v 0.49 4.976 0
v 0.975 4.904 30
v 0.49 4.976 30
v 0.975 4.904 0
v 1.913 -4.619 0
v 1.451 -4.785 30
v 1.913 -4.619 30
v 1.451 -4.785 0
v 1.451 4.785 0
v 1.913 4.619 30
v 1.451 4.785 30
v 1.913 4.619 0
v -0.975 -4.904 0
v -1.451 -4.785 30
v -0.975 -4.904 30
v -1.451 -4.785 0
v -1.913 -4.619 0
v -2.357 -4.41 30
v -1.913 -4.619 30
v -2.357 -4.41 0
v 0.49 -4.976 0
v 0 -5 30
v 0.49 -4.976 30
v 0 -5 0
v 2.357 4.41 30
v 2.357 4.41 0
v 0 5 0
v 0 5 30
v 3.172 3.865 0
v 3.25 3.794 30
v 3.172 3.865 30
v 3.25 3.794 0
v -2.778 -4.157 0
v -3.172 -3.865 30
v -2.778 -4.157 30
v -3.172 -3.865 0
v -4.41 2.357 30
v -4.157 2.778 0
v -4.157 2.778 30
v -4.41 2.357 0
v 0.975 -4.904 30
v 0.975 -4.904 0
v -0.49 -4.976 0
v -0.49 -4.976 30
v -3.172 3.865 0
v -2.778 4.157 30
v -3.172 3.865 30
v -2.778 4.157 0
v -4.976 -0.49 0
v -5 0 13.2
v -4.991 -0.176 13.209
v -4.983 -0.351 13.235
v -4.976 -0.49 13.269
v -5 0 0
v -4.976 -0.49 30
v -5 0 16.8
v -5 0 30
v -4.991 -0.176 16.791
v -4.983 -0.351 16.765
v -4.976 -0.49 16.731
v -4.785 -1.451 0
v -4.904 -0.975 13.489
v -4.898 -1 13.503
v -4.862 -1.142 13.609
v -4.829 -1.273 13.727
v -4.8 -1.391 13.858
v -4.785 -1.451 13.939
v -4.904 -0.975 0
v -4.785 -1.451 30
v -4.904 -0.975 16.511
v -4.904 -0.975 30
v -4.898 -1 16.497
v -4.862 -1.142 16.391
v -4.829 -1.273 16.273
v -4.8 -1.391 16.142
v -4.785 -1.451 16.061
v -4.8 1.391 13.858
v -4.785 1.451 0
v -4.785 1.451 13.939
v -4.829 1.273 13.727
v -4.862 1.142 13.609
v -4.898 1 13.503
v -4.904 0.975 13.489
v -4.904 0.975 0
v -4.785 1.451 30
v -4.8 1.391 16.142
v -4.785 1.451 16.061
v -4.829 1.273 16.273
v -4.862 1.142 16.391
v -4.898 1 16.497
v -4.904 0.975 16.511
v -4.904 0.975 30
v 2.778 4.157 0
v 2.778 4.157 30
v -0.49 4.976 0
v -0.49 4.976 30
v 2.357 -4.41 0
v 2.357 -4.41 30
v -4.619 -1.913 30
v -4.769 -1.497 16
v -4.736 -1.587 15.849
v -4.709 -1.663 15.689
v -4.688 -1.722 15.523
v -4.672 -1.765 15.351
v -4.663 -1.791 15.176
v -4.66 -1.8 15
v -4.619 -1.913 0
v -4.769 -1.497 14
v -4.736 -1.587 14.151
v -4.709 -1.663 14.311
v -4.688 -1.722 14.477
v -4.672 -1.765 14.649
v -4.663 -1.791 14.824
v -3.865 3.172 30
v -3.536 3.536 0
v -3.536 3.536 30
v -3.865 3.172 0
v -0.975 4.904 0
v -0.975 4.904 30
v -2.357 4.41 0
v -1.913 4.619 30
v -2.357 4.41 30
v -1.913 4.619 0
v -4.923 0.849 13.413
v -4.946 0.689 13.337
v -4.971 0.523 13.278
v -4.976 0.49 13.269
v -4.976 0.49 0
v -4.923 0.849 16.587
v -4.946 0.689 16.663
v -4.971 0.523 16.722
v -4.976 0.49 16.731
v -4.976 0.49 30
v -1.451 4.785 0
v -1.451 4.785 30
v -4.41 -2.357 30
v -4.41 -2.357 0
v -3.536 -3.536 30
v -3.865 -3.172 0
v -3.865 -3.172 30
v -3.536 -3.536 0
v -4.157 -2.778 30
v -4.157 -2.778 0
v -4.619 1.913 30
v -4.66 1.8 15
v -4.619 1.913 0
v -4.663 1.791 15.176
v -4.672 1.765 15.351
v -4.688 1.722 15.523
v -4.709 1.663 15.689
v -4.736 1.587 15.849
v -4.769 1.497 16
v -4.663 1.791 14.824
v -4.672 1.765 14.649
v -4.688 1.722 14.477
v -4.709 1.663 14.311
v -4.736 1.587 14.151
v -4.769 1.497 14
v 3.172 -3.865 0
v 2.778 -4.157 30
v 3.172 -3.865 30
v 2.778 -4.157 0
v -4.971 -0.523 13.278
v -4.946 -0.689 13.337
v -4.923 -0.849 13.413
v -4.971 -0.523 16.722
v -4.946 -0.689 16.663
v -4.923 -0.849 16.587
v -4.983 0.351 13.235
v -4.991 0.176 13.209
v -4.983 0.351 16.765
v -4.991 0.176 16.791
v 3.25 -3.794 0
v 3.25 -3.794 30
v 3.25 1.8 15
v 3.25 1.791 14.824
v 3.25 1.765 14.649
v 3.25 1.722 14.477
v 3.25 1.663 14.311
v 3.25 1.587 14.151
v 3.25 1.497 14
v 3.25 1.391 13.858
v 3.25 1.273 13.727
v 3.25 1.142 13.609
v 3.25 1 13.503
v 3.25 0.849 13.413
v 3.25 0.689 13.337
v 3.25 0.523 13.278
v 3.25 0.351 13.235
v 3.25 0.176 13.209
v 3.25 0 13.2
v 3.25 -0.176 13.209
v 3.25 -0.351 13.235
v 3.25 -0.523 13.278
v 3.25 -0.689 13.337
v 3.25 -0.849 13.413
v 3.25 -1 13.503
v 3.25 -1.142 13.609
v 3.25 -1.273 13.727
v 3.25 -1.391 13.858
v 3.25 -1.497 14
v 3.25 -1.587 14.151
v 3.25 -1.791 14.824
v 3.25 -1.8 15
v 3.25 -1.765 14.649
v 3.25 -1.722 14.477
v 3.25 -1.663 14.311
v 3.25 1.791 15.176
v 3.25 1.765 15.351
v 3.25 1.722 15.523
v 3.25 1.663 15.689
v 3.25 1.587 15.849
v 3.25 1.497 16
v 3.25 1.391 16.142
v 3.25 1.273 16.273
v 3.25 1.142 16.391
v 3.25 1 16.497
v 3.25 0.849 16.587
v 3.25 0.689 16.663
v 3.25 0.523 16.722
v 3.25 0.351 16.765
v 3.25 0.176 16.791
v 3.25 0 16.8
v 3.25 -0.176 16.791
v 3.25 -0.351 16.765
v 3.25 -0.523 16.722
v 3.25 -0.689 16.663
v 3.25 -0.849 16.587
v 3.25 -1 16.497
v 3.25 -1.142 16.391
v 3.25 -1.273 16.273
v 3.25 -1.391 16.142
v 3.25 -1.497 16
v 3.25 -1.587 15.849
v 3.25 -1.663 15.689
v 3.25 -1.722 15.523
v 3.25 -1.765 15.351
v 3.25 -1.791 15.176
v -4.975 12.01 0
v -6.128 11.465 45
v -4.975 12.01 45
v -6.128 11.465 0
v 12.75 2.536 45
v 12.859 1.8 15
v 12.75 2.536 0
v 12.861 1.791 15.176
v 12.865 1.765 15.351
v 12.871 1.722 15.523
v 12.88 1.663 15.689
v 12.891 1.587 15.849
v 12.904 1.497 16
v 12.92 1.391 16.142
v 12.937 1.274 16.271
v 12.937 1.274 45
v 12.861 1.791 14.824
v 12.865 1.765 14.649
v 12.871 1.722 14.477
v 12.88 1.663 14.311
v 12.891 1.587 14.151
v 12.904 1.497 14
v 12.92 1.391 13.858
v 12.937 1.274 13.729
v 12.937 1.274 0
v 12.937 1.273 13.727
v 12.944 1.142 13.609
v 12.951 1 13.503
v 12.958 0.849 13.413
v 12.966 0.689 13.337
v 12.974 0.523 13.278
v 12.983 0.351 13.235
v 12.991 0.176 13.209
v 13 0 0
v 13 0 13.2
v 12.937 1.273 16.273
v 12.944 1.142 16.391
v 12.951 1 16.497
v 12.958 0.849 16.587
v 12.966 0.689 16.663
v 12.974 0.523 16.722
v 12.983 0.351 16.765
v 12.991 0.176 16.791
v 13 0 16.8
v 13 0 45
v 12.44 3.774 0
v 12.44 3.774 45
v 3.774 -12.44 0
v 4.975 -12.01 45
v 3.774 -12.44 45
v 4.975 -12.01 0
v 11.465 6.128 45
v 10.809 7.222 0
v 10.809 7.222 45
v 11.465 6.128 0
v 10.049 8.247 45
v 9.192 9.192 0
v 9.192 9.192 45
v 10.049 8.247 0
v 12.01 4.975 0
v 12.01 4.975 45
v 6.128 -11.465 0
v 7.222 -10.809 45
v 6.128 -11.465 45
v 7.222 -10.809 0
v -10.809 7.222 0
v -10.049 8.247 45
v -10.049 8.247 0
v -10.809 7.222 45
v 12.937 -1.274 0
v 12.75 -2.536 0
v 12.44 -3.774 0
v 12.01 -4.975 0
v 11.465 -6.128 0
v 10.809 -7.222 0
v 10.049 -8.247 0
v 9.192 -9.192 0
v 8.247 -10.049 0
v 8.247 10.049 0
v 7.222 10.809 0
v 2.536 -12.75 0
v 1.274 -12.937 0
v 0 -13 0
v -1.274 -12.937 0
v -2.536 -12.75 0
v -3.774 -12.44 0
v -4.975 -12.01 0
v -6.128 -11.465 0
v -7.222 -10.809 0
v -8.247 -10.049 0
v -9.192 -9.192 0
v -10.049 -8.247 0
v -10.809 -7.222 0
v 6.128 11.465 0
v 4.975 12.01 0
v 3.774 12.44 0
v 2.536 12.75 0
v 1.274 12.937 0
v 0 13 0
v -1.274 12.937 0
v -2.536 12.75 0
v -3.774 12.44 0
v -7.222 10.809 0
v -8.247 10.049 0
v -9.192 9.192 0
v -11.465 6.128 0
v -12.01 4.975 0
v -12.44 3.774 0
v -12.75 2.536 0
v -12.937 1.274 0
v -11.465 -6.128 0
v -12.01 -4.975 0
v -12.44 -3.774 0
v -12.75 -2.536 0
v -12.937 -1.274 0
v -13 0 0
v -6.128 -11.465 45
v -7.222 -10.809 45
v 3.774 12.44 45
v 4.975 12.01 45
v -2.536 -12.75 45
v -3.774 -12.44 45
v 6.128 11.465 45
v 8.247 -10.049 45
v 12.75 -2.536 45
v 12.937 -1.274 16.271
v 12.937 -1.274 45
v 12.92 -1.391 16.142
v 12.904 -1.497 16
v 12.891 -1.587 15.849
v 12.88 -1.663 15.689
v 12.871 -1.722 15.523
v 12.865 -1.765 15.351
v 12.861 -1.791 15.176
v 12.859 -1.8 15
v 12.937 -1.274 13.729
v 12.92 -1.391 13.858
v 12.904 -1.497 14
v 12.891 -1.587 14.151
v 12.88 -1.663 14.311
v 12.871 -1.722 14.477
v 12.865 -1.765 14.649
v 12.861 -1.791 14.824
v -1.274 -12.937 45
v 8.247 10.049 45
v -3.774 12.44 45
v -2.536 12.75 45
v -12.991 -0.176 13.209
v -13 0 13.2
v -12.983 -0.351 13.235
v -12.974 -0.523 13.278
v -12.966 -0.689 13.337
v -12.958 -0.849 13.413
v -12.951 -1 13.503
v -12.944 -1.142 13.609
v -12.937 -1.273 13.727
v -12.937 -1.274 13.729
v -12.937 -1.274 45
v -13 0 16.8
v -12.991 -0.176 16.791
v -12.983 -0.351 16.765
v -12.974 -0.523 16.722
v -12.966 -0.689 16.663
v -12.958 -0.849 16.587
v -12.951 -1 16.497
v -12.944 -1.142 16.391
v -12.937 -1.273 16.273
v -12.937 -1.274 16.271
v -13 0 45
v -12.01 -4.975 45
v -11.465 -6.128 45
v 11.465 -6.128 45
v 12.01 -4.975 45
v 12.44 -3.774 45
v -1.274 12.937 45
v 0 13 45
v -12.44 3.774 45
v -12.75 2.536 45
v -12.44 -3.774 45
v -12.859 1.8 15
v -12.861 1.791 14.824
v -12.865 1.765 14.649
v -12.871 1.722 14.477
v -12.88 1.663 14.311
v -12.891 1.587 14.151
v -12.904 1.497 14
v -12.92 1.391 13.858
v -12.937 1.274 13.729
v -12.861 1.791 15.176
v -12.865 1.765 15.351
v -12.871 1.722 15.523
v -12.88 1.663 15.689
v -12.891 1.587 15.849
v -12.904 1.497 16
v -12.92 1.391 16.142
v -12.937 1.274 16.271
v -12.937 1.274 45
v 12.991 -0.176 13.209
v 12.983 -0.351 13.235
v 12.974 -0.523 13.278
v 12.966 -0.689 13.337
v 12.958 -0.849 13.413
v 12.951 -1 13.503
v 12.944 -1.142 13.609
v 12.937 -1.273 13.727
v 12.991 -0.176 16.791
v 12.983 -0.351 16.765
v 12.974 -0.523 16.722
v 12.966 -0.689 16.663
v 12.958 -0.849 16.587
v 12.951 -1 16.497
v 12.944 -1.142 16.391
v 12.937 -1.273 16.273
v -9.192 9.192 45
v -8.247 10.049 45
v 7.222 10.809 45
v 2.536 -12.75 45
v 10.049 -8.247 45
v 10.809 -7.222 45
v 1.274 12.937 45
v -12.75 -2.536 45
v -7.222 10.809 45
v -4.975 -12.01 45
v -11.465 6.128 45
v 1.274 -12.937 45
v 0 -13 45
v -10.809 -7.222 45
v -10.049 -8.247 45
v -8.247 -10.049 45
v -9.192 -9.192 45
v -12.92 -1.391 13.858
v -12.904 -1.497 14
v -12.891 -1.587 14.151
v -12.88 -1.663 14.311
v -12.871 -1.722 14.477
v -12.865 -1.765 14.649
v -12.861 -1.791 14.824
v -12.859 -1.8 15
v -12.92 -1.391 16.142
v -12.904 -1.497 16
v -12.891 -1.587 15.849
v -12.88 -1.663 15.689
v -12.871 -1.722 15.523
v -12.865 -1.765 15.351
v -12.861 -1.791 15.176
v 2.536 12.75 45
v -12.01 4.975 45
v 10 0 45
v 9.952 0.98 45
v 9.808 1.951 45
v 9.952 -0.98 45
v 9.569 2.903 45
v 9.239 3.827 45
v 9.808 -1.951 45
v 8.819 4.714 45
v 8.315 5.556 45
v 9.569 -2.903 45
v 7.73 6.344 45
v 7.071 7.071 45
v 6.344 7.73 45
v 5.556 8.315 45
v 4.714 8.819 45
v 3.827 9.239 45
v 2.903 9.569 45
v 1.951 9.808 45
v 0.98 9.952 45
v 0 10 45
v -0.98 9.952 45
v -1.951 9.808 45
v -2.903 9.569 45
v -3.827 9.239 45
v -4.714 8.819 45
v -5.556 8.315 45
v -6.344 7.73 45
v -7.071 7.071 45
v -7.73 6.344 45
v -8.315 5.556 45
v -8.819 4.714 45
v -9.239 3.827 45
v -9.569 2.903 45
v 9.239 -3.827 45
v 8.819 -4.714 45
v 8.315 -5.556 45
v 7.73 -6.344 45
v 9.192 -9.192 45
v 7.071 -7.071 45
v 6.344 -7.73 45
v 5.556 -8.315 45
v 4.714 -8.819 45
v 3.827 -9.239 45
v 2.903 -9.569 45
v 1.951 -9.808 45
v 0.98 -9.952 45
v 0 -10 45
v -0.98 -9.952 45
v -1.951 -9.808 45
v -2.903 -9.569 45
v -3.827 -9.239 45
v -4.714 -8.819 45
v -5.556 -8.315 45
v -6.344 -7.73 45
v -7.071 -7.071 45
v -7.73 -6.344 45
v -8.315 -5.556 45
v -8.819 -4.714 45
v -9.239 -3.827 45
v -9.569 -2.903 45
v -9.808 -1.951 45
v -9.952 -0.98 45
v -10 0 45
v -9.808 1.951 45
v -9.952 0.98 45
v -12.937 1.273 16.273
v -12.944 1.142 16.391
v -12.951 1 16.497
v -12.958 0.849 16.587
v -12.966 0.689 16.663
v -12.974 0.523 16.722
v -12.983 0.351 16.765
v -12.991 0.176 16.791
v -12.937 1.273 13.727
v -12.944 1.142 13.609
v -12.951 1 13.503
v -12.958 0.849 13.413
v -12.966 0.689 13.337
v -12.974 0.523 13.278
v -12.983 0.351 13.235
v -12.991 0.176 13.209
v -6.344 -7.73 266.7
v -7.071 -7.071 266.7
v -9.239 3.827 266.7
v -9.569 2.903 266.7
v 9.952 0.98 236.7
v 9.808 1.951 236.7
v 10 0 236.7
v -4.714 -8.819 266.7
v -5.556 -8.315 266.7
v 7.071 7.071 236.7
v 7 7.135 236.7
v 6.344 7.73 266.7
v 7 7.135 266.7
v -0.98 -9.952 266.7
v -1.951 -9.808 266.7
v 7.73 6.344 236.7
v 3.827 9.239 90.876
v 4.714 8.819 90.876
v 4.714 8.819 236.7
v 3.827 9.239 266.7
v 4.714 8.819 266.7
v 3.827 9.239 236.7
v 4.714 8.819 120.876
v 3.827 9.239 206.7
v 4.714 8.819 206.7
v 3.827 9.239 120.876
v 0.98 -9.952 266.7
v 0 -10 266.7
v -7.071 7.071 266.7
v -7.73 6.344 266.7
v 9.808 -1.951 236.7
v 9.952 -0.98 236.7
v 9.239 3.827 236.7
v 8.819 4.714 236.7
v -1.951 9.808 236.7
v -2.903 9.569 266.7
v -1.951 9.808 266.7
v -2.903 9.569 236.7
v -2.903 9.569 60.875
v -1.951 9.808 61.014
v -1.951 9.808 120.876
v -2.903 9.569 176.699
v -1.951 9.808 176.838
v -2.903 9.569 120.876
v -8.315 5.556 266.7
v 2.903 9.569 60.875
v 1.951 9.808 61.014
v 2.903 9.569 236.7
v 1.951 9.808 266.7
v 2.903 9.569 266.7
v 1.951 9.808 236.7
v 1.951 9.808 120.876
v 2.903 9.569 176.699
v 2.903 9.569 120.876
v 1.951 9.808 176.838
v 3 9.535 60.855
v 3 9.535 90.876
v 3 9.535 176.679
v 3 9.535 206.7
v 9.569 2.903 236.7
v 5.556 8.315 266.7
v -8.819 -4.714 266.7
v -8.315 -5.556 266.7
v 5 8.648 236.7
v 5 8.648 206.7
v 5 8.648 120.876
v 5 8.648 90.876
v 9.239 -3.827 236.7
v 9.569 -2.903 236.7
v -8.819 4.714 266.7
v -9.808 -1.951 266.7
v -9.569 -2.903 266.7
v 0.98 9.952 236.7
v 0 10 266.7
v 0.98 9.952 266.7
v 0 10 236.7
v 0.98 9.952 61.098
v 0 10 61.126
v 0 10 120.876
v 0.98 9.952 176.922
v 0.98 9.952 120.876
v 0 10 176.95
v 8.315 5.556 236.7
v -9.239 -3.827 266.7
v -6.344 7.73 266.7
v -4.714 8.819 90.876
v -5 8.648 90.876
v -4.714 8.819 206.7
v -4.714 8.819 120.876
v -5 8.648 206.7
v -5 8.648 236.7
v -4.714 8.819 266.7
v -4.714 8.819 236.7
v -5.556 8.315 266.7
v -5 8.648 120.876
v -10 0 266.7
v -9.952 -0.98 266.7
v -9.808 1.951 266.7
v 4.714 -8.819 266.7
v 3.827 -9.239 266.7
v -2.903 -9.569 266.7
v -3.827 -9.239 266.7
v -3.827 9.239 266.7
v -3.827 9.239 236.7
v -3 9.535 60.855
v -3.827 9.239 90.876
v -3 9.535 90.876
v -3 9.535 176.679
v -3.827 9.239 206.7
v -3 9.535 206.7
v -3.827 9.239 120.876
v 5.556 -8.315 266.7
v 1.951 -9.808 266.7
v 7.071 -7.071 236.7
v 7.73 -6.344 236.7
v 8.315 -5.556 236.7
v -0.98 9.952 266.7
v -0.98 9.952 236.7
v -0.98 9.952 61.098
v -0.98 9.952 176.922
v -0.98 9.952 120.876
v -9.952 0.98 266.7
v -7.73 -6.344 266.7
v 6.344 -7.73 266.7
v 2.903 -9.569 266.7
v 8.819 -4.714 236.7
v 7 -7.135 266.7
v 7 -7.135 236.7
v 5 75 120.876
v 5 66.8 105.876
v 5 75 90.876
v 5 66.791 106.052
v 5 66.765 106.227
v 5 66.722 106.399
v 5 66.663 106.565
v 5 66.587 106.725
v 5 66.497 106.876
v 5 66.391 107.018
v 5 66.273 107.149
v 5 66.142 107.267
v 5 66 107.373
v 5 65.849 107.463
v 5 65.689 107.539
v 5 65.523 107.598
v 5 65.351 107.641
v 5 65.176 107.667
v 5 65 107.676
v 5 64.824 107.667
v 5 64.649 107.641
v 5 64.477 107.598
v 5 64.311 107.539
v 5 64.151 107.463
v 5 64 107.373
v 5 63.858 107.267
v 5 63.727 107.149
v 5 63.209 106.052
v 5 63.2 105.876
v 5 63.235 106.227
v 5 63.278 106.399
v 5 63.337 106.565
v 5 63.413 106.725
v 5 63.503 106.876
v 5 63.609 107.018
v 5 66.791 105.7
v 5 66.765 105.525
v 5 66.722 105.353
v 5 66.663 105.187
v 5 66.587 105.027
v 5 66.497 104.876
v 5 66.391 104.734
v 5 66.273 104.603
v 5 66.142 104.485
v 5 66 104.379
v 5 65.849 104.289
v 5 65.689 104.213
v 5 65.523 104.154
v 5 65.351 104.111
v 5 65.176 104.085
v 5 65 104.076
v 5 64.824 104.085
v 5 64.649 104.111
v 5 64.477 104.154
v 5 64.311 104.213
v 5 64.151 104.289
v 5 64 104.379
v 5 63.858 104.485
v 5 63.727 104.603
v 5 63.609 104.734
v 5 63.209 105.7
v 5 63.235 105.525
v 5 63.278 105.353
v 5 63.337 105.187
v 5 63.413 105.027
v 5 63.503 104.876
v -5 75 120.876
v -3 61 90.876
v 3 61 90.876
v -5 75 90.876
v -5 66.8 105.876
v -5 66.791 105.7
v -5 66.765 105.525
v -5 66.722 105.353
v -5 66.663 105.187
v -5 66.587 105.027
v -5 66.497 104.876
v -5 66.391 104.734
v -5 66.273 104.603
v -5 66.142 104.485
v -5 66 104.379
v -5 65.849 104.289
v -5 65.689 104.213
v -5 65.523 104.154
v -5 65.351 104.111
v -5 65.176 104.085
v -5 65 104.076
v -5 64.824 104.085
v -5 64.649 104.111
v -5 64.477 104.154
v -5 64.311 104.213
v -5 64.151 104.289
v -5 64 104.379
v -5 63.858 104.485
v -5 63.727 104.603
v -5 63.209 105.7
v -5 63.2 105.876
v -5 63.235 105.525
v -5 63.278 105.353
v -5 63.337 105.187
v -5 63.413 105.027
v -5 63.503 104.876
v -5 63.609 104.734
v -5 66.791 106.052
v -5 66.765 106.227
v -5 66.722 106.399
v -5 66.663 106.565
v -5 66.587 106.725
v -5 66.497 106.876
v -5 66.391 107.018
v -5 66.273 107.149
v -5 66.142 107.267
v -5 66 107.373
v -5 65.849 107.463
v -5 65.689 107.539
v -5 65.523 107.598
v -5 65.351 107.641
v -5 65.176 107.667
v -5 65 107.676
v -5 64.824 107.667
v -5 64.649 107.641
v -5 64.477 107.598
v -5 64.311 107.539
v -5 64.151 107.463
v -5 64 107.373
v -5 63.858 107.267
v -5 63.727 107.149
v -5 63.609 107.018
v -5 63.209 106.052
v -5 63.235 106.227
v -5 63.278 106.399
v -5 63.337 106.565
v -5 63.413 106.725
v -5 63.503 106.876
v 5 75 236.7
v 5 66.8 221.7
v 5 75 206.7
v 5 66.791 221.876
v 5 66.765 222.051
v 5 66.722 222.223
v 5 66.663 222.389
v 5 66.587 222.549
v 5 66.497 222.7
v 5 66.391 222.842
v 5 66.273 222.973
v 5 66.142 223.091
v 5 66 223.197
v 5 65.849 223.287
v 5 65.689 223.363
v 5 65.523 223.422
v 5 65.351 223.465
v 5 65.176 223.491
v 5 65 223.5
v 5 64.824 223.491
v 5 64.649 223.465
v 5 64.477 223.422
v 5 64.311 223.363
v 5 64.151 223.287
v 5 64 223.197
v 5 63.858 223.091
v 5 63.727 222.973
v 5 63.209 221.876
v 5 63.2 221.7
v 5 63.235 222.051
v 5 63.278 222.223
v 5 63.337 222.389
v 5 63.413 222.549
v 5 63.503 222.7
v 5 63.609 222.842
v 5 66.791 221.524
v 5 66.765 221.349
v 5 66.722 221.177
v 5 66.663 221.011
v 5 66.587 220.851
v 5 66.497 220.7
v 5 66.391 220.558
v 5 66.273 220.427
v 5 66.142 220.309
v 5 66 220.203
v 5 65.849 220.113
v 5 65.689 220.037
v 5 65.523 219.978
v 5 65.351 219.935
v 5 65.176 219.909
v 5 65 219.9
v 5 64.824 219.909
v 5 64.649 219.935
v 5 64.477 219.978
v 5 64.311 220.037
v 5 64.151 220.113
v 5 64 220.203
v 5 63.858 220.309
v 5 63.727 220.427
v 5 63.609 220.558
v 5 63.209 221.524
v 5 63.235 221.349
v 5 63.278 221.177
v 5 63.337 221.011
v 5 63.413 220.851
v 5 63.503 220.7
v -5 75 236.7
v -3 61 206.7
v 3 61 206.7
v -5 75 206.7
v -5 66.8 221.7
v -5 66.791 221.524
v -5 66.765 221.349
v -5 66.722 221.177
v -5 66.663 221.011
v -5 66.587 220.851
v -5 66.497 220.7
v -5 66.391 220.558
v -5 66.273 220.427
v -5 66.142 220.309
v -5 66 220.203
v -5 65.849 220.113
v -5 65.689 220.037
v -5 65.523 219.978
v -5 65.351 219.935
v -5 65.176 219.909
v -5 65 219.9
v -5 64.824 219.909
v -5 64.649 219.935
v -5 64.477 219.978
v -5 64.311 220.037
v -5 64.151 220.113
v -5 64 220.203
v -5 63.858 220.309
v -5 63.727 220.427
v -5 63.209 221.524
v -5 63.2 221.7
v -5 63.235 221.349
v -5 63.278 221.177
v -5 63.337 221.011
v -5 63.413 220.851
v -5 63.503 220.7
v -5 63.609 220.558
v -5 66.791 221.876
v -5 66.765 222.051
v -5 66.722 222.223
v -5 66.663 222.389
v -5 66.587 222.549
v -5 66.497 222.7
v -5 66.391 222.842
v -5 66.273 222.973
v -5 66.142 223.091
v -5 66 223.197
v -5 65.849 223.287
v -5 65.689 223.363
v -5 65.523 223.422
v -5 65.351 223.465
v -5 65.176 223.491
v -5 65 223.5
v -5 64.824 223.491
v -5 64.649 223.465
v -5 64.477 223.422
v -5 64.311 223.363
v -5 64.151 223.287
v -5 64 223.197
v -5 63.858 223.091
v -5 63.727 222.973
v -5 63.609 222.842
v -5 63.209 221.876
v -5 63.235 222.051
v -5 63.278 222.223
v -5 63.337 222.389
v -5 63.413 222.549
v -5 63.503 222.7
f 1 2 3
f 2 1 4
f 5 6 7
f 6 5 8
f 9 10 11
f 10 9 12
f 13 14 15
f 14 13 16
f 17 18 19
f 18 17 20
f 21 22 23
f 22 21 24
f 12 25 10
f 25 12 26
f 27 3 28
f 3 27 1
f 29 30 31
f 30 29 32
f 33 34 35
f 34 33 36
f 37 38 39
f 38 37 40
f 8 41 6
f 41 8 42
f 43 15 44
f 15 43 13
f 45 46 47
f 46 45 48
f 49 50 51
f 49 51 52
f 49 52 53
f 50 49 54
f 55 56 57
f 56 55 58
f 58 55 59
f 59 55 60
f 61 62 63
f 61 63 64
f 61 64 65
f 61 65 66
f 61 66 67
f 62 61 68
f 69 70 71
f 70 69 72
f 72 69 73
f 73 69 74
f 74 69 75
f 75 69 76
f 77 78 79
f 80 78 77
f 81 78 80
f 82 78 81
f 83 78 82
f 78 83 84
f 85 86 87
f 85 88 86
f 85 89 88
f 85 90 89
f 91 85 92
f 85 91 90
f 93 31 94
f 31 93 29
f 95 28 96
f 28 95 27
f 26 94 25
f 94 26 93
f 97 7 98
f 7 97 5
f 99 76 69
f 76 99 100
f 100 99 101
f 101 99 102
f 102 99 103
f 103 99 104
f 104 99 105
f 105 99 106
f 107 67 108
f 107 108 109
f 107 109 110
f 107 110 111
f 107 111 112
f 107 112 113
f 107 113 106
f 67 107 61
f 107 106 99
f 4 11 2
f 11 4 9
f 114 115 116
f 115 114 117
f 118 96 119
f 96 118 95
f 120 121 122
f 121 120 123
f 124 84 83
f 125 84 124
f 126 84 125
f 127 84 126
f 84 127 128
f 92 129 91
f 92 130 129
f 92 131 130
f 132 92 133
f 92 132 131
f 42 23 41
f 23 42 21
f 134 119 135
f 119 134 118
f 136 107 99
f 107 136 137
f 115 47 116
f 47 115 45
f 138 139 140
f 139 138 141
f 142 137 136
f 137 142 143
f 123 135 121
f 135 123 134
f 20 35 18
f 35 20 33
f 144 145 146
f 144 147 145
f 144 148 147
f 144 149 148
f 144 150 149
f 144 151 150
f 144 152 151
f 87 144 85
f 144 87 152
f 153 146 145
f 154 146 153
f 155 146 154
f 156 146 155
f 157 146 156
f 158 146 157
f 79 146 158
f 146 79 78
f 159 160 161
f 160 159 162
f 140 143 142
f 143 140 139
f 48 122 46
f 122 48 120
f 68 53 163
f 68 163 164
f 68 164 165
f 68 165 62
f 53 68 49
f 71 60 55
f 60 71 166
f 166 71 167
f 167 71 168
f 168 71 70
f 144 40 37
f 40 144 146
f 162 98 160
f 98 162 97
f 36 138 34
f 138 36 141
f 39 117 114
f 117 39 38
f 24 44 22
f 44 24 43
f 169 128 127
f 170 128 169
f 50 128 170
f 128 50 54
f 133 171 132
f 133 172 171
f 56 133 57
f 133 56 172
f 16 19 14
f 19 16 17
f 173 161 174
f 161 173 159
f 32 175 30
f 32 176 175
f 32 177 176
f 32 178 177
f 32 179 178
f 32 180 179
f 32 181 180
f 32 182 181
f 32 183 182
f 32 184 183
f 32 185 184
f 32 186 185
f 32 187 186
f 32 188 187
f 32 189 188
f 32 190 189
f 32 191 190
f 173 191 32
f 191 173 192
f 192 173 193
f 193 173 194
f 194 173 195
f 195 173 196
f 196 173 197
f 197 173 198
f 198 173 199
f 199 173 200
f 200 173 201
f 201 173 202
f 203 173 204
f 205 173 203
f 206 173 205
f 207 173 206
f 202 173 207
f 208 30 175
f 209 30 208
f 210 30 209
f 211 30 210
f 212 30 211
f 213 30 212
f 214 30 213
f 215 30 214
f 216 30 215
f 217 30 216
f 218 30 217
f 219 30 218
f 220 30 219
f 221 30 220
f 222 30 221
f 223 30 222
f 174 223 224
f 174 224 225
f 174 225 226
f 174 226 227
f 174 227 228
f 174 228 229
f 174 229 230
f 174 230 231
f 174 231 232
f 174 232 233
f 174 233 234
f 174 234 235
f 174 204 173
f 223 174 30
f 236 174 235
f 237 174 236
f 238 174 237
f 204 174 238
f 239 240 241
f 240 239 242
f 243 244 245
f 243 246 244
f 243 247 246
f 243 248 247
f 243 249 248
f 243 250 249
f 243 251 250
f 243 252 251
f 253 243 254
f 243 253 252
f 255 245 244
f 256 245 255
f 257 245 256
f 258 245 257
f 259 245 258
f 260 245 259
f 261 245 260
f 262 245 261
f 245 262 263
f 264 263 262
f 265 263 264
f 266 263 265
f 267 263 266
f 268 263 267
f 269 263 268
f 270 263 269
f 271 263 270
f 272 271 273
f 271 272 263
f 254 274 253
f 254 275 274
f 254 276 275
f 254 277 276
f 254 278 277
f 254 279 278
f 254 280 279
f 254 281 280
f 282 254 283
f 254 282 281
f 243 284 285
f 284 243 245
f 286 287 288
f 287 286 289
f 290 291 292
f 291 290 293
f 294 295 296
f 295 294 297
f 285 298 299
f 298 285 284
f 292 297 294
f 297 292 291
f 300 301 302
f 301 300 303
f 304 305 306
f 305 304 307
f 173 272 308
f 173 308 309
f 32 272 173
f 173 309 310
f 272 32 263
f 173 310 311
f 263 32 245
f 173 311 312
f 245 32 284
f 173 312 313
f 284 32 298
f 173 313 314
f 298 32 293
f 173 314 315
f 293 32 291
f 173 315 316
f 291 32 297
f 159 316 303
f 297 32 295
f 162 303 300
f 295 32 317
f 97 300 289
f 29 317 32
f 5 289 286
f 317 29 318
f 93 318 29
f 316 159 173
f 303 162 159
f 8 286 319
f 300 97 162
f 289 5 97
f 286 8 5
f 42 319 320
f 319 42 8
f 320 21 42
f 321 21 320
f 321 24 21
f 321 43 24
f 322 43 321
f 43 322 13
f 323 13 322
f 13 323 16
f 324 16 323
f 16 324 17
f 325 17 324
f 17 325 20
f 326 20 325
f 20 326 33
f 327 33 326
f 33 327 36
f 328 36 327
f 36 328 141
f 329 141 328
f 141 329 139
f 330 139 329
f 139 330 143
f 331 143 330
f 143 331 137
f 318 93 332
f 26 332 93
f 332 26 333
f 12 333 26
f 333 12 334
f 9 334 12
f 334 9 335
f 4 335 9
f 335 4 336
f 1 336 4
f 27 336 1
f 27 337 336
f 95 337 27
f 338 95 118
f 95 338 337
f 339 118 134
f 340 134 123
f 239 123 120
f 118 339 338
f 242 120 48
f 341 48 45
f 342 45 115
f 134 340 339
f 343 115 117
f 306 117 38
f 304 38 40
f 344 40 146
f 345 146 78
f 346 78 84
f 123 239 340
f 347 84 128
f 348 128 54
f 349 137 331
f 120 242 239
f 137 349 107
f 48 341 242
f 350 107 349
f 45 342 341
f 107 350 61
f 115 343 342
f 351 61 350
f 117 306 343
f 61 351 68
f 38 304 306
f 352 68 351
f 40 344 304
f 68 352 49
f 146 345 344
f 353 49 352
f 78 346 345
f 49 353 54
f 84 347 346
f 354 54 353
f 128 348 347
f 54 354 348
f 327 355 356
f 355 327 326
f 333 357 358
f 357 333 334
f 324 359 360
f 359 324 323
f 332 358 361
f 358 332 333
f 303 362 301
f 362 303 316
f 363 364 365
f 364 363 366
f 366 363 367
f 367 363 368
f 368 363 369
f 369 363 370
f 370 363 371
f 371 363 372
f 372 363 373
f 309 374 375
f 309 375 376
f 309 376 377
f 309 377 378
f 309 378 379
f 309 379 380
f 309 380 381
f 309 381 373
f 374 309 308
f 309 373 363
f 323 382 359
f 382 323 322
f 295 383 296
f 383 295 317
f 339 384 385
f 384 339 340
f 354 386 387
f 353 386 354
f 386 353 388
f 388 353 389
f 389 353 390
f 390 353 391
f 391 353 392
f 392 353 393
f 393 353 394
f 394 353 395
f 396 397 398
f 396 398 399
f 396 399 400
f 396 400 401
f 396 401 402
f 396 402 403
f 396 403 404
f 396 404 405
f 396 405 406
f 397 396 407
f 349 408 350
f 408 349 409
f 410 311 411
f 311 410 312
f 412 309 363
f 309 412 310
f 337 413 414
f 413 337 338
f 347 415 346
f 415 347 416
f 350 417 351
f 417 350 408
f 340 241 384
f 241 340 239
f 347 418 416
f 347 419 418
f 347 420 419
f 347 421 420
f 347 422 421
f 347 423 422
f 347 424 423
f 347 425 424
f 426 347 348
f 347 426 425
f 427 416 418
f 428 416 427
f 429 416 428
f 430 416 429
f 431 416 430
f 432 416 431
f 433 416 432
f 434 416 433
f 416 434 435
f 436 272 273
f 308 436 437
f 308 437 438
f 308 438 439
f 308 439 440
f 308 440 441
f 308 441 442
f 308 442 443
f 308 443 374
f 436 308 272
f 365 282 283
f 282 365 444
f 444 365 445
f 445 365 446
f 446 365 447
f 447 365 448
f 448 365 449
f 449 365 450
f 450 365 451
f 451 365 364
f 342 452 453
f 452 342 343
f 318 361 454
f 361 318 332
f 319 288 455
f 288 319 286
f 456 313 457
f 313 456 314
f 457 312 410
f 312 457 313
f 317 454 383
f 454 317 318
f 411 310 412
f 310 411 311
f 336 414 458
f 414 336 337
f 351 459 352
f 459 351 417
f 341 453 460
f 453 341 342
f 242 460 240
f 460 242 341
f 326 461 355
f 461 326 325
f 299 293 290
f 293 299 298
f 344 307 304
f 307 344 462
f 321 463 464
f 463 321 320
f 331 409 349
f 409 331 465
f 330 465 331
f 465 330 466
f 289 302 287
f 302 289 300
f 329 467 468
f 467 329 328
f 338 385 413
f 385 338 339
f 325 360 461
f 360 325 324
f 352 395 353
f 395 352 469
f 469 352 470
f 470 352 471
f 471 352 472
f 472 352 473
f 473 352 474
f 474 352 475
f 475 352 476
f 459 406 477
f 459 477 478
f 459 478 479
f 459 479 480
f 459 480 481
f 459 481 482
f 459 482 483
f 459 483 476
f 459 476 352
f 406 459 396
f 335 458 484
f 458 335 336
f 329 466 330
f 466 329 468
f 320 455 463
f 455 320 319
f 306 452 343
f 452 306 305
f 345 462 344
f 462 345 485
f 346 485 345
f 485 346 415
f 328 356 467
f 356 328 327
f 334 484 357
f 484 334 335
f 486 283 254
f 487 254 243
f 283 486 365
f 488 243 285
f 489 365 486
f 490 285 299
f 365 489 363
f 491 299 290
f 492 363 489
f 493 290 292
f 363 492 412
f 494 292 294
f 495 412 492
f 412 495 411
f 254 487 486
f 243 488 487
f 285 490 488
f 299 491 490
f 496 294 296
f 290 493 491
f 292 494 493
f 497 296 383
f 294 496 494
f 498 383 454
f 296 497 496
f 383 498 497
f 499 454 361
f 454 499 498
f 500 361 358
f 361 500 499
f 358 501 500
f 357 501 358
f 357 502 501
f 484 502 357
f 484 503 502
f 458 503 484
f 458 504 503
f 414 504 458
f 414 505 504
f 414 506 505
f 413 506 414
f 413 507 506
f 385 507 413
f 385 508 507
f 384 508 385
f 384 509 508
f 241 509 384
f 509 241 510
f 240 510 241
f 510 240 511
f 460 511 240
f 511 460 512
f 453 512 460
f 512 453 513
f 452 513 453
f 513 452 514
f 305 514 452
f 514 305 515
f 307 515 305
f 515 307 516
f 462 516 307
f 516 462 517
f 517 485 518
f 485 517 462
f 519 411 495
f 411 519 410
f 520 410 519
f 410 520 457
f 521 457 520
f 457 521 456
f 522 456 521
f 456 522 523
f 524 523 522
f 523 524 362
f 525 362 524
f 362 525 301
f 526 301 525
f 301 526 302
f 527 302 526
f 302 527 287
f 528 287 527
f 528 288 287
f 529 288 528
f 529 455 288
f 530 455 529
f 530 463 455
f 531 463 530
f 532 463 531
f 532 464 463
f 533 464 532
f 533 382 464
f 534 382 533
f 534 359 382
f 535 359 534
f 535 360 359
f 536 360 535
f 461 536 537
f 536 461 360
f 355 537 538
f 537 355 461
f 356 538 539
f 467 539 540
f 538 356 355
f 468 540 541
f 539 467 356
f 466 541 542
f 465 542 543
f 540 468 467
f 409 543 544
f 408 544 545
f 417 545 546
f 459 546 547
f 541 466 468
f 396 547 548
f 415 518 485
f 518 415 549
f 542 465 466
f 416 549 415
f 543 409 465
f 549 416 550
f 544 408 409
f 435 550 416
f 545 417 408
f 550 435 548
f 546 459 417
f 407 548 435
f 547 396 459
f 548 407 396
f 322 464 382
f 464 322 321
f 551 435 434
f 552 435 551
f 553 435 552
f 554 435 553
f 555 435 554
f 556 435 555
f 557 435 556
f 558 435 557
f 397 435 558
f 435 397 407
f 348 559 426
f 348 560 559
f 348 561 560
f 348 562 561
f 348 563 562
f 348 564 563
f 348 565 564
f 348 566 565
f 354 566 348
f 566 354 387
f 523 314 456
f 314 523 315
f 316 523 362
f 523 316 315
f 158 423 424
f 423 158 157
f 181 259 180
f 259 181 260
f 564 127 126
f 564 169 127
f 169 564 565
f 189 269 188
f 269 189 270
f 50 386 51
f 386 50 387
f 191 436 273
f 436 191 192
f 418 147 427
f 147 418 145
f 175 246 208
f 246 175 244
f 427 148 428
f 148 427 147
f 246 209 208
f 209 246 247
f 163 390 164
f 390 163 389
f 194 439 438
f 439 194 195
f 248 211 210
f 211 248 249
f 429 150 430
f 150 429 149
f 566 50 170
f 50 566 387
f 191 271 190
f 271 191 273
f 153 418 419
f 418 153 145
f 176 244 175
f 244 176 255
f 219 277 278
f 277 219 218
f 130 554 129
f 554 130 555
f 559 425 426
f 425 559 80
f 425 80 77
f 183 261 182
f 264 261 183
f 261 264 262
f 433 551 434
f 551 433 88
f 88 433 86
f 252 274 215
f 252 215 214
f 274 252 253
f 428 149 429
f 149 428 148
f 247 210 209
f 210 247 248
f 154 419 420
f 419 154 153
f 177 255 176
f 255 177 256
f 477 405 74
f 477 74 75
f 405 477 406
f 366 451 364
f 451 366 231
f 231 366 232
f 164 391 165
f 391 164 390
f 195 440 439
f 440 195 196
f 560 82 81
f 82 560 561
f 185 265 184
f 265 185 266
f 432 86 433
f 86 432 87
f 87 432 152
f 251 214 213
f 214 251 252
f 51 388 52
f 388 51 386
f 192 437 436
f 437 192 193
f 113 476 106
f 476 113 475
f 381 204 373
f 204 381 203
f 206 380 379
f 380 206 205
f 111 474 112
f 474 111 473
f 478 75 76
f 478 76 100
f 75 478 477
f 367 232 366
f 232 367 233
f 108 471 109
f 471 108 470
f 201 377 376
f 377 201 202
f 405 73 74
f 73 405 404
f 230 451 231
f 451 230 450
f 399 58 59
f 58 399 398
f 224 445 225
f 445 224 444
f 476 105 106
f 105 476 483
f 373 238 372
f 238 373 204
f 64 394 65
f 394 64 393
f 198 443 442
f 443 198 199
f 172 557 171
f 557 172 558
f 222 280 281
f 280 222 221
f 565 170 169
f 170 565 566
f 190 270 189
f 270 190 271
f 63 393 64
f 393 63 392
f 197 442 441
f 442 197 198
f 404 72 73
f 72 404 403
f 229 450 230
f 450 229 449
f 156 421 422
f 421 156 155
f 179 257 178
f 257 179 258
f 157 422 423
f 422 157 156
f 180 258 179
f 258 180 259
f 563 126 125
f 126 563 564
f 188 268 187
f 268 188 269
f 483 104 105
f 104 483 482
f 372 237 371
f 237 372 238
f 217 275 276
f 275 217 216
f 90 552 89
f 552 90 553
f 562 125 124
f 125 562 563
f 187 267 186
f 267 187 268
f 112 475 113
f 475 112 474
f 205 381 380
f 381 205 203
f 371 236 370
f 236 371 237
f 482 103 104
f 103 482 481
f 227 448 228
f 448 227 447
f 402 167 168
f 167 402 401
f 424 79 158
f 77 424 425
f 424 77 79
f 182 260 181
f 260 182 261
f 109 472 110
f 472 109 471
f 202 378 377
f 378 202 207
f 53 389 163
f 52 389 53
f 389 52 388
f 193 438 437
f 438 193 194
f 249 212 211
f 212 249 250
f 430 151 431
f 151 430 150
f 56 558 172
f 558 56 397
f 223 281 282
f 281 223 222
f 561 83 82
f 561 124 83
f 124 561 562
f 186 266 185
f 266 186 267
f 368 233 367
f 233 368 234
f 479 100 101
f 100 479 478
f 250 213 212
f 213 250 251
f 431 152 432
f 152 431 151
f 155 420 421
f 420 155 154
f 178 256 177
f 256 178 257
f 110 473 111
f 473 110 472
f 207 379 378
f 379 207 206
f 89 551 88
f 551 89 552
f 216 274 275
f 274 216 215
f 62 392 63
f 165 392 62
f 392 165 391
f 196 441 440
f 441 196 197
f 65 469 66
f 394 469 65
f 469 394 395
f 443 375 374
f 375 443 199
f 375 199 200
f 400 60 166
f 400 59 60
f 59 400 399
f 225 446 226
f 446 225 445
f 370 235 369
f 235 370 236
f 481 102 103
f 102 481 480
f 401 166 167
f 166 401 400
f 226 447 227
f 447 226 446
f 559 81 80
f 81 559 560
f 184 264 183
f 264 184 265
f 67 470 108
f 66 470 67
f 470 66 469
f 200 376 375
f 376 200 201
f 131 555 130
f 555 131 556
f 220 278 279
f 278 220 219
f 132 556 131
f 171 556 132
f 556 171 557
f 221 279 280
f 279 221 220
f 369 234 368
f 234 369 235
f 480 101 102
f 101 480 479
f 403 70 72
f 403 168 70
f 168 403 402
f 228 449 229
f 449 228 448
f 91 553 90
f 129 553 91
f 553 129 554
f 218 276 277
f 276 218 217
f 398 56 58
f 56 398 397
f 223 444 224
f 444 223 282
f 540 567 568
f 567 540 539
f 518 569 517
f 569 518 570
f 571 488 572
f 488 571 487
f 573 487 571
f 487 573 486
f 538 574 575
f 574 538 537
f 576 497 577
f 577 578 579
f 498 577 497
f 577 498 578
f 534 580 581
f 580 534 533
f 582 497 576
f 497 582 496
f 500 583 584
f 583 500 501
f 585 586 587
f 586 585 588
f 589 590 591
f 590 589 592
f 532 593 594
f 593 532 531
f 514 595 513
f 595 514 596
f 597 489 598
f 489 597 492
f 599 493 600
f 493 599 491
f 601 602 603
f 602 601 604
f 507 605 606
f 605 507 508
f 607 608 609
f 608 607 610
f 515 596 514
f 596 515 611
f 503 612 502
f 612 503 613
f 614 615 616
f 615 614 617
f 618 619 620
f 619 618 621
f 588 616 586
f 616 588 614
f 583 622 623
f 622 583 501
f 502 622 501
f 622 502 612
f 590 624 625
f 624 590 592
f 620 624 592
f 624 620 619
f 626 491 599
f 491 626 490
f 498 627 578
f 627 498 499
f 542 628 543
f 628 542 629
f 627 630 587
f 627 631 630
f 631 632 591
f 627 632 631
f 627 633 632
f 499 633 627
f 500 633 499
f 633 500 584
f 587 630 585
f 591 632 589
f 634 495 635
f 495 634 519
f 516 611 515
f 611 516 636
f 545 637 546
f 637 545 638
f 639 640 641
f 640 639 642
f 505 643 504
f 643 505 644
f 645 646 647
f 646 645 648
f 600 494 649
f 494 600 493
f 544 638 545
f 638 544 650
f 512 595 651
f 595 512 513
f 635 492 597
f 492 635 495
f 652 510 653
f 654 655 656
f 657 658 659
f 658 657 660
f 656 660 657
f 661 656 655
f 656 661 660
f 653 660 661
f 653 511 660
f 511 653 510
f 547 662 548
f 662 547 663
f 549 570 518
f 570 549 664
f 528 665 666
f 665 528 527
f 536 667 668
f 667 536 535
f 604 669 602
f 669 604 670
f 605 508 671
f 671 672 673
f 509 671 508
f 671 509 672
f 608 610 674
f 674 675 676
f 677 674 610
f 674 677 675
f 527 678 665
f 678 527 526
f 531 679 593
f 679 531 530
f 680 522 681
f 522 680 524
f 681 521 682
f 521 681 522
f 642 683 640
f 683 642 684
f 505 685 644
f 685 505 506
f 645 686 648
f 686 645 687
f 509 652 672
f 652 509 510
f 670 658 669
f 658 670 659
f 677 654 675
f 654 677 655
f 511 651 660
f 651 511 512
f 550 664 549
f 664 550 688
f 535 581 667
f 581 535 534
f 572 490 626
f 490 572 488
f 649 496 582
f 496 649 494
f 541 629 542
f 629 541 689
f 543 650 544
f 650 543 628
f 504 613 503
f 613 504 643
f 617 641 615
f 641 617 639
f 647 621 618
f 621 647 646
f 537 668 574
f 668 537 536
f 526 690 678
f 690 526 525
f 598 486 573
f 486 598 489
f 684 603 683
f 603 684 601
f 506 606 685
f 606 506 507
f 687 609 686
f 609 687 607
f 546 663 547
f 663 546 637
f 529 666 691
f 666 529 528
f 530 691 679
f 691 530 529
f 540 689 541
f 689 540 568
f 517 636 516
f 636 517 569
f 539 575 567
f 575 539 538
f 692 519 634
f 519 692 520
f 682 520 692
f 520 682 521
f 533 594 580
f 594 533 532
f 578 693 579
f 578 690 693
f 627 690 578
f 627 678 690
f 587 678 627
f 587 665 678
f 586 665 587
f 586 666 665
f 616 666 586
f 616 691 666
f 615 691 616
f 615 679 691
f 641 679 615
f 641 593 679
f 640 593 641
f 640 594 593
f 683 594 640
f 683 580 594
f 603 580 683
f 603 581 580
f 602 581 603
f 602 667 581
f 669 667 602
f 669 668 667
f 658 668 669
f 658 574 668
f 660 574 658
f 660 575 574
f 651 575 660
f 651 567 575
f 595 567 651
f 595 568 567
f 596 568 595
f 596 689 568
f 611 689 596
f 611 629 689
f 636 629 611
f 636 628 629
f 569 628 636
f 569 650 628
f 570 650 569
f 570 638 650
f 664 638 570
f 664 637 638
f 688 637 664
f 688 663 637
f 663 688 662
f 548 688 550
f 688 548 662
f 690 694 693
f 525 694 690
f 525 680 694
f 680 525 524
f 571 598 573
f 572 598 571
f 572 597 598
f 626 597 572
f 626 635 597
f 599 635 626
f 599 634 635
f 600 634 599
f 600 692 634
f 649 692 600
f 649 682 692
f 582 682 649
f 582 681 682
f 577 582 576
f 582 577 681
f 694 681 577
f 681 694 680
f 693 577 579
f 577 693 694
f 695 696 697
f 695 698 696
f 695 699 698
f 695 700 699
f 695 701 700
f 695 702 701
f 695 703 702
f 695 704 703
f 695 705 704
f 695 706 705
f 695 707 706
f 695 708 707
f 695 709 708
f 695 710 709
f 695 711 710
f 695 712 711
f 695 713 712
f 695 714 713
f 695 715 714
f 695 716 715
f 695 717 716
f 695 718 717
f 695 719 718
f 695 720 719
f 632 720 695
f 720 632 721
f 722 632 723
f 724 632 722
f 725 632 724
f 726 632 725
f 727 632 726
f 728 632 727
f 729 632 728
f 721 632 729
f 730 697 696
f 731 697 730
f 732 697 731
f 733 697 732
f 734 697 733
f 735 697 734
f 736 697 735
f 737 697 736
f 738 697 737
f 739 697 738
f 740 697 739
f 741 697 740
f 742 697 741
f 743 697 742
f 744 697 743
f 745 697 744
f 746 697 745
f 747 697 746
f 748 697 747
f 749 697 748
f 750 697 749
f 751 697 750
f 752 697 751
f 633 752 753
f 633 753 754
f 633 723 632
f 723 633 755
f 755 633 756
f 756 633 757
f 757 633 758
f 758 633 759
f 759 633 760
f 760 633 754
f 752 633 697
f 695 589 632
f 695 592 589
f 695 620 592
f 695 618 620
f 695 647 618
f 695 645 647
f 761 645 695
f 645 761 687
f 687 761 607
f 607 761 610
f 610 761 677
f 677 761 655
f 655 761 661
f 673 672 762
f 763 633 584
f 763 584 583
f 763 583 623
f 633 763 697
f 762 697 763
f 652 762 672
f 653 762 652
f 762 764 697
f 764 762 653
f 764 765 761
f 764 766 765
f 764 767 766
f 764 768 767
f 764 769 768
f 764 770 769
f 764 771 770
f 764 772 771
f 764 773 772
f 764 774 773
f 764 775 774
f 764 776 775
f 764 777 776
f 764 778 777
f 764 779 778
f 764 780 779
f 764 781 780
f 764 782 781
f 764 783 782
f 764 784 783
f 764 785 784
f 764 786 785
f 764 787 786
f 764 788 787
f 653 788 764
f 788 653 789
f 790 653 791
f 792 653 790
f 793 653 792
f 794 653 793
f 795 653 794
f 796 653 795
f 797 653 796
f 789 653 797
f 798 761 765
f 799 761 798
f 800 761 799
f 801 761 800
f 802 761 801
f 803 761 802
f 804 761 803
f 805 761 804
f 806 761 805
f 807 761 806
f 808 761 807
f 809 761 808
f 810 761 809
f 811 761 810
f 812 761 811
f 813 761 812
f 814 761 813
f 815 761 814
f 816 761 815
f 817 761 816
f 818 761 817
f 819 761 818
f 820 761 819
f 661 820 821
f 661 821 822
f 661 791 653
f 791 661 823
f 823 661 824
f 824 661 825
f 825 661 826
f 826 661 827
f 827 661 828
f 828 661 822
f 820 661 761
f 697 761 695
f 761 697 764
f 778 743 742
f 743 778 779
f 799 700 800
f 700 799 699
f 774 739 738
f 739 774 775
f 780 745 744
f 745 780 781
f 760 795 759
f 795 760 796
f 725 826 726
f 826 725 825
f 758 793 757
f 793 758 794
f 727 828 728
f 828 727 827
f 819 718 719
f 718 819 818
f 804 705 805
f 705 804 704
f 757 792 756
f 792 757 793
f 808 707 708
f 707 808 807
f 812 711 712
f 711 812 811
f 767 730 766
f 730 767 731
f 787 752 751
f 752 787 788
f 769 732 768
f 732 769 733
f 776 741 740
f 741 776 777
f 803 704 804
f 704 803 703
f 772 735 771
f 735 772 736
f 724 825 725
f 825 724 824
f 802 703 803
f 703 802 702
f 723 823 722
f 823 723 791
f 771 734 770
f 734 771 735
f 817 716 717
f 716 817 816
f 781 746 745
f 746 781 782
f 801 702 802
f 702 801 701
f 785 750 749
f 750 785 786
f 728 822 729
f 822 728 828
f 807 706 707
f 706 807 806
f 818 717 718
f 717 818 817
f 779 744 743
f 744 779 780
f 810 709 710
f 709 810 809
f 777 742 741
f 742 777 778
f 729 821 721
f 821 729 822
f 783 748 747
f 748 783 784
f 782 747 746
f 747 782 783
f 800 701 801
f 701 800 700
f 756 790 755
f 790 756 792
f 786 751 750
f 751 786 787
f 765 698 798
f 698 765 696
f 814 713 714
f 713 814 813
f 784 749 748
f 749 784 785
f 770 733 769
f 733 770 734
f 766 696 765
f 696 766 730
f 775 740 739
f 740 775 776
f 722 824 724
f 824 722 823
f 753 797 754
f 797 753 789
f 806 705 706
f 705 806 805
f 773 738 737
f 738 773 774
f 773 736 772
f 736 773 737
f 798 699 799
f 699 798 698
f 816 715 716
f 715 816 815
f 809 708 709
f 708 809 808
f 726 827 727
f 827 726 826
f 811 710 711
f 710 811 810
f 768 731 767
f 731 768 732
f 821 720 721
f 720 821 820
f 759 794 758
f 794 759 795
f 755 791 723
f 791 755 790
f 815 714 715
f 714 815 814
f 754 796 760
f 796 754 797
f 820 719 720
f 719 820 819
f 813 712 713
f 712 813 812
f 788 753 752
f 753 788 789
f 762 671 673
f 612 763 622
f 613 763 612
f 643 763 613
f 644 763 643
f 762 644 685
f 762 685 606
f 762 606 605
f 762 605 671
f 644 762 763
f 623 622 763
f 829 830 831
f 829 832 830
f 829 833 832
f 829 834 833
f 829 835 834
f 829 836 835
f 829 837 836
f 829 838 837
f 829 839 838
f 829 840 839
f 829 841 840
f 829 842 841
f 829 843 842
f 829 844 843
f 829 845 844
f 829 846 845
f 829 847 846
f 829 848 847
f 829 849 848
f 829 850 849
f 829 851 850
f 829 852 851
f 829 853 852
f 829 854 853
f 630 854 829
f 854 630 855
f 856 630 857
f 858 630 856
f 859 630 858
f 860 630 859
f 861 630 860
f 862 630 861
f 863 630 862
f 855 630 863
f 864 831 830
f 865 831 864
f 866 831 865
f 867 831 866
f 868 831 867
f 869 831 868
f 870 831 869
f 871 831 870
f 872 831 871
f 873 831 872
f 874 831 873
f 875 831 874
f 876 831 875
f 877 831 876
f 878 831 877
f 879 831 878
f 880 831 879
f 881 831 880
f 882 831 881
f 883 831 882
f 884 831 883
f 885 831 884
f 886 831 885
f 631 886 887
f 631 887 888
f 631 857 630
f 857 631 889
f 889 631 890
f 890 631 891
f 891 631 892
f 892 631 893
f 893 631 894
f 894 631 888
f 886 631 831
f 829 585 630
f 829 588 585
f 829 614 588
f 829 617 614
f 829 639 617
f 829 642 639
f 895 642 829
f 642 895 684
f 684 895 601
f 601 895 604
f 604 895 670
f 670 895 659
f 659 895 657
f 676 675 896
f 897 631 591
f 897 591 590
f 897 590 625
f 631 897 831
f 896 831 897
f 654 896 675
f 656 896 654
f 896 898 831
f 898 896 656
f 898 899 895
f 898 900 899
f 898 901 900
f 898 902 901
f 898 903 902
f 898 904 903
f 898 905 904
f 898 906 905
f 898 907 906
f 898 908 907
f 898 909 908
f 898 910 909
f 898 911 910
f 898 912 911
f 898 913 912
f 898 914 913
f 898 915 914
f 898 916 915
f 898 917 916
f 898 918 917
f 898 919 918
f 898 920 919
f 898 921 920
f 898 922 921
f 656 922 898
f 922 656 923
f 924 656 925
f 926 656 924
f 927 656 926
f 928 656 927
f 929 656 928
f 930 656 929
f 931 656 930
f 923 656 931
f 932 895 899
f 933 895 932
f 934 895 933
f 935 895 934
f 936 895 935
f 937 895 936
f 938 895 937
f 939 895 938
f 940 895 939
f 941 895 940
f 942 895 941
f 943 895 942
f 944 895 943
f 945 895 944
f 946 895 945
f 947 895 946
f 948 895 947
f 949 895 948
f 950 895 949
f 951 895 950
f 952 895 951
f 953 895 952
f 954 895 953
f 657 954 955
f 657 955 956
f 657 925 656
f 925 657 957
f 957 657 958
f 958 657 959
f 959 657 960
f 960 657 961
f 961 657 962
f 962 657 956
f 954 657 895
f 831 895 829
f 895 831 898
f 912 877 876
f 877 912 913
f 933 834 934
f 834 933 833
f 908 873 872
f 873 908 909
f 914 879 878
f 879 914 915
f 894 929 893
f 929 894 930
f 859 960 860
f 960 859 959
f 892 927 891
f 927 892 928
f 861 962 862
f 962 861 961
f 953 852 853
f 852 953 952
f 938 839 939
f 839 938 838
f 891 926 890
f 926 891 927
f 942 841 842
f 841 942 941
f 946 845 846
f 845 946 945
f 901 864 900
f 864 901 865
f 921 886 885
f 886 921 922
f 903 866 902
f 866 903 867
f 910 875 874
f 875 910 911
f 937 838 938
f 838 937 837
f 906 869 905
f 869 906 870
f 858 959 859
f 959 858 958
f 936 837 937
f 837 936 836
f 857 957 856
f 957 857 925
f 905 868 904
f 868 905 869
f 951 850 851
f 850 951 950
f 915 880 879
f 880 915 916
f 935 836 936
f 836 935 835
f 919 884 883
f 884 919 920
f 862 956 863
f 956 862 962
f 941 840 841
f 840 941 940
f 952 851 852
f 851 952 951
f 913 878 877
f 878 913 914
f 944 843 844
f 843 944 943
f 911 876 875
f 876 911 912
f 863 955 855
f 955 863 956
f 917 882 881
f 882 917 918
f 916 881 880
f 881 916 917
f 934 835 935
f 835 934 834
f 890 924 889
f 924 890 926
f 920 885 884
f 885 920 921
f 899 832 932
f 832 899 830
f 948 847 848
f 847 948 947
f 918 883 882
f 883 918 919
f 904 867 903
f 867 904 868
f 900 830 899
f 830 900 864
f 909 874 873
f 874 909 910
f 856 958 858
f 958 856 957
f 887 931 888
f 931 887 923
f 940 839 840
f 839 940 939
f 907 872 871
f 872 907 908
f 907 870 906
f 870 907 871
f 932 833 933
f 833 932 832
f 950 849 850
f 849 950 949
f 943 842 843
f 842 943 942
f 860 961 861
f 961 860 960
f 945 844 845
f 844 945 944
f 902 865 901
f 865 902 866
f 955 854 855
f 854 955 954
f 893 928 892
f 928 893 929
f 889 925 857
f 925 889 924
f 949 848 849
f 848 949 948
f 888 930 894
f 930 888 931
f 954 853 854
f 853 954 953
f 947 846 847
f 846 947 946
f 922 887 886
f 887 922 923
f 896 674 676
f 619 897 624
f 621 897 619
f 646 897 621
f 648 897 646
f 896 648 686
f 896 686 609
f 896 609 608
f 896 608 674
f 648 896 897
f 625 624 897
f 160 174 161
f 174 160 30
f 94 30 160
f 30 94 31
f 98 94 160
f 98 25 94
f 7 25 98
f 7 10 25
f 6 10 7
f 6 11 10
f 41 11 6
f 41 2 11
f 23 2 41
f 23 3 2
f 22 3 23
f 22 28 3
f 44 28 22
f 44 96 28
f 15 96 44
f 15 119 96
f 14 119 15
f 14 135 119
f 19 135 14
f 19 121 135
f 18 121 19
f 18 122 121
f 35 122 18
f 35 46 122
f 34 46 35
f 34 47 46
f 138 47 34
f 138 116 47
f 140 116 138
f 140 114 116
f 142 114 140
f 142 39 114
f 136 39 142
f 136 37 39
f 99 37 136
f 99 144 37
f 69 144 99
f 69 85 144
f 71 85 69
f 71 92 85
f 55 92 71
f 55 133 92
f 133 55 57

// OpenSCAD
// FILE: Calibrated_Antenna_Mast_V9.0.scad
// TOLERANCE: Calibrated for 0.3mm printer error.
// COMPATIBILITY: Matches V8.5 Gear Rod and V11.9 Chassis.

$fn = 64; 
mm = 25.4; 

// --- SHAFT & ANTENNA SPECS ---
gear_rod_dia  = 9.5;    
d_slice_depth = 1.5;    
socket_depth  = 30;     
antenna_h     = 10.5 * mm; 
hole_spacing  = 4.56 * mm; 
// UPDATED: Changed from 0.15mm to 3.6mm for M3 Bolt
hole_dia      = 3.6; 

// --- GEOMETRY ---
main_rod_dia           = 20; 
base_reinforcement_dia = 26; 
horizontal_reach       = 65; 
arm_height             = 30; 
arm_width              = 10; 
gusset_thick           = 6; 

// --- TOP D-CUT SPECS (For Webcam Topper) ---
top_dcut_depth = 3;   
top_dcut_h     = 30;  

// --- ARM SLIDE ADJUSTMENT ---
arm_slide_down = 45; 

// ============================================================
// RENDER
// ============================================================
union() {
    // 1. REINFORCED D-SOCKET BASE
    difference() {
        color("Gold") cylinder(h = socket_depth + 15, d = base_reinforcement_dia); 
        translate([0, 0, -1]) {
            difference() {
                // CALIBRATED: Increased diameter for 0.3mm shrink
                cylinder(h = socket_depth + 2, d = gear_rod_dia + 0.5);
                translate([gear_rod_dia/2 - d_slice_depth, -gear_rod_dia, 0])
                    cube([gear_rod_dia, gear_rod_dia*2, socket_depth + 5]); 
            }
        }
        // Cross-bolt hole for locking mast to rod
        translate([0, 0, socket_depth / 2]) rotate([0, 90, 0]) 
            cylinder(h = base_reinforcement_dia + 2, d = 3.6, center=true); 
    }

    // 2. THE MAIN VERTICAL MAST (With Top D-Cut)
    color("Gold") translate([0, 0, socket_depth + 15]) {
        difference() {
            cylinder(h = antenna_h - (socket_depth + 15), d = main_rod_dia); 
            // TOP D-CUT FLAT
            translate([main_rod_dia/2 - top_dcut_depth, -main_rod_dia, antenna_h - (socket_depth + 15) - top_dcut_h])
                cube([10, main_rod_dia*2, top_dcut_h + 1]);
        }
    }
    
    // Conical transition at base for strength
    color("Gold") translate([0, 0, socket_depth + 15])
        mirror([0,0,1]) cylinder(h=15, d1=base_reinforcement_dia, d2=main_rod_dia); 

    // 3. THE TWO REINFORCED FIN ARMS
    for (z_pos = [antenna_h - hole_spacing - arm_slide_down, antenna_h - arm_slide_down]) { 
        translate([0, 0, z_pos - arm_height/2]) {
            color("Gold") difference() {
                translate([-arm_width/2, 0, 0]) 
                    cube([arm_width, horizontal_reach + 10, arm_height]); 
                // Antenna mounting hole
                translate([-arm_width/2 - 1, horizontal_reach, arm_height/2])
                    rotate([0, 90, 0]) 
                        cylinder(h = arm_width + 2, d = hole_dia); 
            }
            // Strength Gusset (Red)
            color("Red") 
            translate([-gusset_thick/2, 1, 0]) 
            rotate([90, 0, 90]) 
            linear_extrude(gusset_thick)
            polygon([[0, 0], [0, -35], [horizontal_reach - 5, 0]]); 
        }
    }
}
